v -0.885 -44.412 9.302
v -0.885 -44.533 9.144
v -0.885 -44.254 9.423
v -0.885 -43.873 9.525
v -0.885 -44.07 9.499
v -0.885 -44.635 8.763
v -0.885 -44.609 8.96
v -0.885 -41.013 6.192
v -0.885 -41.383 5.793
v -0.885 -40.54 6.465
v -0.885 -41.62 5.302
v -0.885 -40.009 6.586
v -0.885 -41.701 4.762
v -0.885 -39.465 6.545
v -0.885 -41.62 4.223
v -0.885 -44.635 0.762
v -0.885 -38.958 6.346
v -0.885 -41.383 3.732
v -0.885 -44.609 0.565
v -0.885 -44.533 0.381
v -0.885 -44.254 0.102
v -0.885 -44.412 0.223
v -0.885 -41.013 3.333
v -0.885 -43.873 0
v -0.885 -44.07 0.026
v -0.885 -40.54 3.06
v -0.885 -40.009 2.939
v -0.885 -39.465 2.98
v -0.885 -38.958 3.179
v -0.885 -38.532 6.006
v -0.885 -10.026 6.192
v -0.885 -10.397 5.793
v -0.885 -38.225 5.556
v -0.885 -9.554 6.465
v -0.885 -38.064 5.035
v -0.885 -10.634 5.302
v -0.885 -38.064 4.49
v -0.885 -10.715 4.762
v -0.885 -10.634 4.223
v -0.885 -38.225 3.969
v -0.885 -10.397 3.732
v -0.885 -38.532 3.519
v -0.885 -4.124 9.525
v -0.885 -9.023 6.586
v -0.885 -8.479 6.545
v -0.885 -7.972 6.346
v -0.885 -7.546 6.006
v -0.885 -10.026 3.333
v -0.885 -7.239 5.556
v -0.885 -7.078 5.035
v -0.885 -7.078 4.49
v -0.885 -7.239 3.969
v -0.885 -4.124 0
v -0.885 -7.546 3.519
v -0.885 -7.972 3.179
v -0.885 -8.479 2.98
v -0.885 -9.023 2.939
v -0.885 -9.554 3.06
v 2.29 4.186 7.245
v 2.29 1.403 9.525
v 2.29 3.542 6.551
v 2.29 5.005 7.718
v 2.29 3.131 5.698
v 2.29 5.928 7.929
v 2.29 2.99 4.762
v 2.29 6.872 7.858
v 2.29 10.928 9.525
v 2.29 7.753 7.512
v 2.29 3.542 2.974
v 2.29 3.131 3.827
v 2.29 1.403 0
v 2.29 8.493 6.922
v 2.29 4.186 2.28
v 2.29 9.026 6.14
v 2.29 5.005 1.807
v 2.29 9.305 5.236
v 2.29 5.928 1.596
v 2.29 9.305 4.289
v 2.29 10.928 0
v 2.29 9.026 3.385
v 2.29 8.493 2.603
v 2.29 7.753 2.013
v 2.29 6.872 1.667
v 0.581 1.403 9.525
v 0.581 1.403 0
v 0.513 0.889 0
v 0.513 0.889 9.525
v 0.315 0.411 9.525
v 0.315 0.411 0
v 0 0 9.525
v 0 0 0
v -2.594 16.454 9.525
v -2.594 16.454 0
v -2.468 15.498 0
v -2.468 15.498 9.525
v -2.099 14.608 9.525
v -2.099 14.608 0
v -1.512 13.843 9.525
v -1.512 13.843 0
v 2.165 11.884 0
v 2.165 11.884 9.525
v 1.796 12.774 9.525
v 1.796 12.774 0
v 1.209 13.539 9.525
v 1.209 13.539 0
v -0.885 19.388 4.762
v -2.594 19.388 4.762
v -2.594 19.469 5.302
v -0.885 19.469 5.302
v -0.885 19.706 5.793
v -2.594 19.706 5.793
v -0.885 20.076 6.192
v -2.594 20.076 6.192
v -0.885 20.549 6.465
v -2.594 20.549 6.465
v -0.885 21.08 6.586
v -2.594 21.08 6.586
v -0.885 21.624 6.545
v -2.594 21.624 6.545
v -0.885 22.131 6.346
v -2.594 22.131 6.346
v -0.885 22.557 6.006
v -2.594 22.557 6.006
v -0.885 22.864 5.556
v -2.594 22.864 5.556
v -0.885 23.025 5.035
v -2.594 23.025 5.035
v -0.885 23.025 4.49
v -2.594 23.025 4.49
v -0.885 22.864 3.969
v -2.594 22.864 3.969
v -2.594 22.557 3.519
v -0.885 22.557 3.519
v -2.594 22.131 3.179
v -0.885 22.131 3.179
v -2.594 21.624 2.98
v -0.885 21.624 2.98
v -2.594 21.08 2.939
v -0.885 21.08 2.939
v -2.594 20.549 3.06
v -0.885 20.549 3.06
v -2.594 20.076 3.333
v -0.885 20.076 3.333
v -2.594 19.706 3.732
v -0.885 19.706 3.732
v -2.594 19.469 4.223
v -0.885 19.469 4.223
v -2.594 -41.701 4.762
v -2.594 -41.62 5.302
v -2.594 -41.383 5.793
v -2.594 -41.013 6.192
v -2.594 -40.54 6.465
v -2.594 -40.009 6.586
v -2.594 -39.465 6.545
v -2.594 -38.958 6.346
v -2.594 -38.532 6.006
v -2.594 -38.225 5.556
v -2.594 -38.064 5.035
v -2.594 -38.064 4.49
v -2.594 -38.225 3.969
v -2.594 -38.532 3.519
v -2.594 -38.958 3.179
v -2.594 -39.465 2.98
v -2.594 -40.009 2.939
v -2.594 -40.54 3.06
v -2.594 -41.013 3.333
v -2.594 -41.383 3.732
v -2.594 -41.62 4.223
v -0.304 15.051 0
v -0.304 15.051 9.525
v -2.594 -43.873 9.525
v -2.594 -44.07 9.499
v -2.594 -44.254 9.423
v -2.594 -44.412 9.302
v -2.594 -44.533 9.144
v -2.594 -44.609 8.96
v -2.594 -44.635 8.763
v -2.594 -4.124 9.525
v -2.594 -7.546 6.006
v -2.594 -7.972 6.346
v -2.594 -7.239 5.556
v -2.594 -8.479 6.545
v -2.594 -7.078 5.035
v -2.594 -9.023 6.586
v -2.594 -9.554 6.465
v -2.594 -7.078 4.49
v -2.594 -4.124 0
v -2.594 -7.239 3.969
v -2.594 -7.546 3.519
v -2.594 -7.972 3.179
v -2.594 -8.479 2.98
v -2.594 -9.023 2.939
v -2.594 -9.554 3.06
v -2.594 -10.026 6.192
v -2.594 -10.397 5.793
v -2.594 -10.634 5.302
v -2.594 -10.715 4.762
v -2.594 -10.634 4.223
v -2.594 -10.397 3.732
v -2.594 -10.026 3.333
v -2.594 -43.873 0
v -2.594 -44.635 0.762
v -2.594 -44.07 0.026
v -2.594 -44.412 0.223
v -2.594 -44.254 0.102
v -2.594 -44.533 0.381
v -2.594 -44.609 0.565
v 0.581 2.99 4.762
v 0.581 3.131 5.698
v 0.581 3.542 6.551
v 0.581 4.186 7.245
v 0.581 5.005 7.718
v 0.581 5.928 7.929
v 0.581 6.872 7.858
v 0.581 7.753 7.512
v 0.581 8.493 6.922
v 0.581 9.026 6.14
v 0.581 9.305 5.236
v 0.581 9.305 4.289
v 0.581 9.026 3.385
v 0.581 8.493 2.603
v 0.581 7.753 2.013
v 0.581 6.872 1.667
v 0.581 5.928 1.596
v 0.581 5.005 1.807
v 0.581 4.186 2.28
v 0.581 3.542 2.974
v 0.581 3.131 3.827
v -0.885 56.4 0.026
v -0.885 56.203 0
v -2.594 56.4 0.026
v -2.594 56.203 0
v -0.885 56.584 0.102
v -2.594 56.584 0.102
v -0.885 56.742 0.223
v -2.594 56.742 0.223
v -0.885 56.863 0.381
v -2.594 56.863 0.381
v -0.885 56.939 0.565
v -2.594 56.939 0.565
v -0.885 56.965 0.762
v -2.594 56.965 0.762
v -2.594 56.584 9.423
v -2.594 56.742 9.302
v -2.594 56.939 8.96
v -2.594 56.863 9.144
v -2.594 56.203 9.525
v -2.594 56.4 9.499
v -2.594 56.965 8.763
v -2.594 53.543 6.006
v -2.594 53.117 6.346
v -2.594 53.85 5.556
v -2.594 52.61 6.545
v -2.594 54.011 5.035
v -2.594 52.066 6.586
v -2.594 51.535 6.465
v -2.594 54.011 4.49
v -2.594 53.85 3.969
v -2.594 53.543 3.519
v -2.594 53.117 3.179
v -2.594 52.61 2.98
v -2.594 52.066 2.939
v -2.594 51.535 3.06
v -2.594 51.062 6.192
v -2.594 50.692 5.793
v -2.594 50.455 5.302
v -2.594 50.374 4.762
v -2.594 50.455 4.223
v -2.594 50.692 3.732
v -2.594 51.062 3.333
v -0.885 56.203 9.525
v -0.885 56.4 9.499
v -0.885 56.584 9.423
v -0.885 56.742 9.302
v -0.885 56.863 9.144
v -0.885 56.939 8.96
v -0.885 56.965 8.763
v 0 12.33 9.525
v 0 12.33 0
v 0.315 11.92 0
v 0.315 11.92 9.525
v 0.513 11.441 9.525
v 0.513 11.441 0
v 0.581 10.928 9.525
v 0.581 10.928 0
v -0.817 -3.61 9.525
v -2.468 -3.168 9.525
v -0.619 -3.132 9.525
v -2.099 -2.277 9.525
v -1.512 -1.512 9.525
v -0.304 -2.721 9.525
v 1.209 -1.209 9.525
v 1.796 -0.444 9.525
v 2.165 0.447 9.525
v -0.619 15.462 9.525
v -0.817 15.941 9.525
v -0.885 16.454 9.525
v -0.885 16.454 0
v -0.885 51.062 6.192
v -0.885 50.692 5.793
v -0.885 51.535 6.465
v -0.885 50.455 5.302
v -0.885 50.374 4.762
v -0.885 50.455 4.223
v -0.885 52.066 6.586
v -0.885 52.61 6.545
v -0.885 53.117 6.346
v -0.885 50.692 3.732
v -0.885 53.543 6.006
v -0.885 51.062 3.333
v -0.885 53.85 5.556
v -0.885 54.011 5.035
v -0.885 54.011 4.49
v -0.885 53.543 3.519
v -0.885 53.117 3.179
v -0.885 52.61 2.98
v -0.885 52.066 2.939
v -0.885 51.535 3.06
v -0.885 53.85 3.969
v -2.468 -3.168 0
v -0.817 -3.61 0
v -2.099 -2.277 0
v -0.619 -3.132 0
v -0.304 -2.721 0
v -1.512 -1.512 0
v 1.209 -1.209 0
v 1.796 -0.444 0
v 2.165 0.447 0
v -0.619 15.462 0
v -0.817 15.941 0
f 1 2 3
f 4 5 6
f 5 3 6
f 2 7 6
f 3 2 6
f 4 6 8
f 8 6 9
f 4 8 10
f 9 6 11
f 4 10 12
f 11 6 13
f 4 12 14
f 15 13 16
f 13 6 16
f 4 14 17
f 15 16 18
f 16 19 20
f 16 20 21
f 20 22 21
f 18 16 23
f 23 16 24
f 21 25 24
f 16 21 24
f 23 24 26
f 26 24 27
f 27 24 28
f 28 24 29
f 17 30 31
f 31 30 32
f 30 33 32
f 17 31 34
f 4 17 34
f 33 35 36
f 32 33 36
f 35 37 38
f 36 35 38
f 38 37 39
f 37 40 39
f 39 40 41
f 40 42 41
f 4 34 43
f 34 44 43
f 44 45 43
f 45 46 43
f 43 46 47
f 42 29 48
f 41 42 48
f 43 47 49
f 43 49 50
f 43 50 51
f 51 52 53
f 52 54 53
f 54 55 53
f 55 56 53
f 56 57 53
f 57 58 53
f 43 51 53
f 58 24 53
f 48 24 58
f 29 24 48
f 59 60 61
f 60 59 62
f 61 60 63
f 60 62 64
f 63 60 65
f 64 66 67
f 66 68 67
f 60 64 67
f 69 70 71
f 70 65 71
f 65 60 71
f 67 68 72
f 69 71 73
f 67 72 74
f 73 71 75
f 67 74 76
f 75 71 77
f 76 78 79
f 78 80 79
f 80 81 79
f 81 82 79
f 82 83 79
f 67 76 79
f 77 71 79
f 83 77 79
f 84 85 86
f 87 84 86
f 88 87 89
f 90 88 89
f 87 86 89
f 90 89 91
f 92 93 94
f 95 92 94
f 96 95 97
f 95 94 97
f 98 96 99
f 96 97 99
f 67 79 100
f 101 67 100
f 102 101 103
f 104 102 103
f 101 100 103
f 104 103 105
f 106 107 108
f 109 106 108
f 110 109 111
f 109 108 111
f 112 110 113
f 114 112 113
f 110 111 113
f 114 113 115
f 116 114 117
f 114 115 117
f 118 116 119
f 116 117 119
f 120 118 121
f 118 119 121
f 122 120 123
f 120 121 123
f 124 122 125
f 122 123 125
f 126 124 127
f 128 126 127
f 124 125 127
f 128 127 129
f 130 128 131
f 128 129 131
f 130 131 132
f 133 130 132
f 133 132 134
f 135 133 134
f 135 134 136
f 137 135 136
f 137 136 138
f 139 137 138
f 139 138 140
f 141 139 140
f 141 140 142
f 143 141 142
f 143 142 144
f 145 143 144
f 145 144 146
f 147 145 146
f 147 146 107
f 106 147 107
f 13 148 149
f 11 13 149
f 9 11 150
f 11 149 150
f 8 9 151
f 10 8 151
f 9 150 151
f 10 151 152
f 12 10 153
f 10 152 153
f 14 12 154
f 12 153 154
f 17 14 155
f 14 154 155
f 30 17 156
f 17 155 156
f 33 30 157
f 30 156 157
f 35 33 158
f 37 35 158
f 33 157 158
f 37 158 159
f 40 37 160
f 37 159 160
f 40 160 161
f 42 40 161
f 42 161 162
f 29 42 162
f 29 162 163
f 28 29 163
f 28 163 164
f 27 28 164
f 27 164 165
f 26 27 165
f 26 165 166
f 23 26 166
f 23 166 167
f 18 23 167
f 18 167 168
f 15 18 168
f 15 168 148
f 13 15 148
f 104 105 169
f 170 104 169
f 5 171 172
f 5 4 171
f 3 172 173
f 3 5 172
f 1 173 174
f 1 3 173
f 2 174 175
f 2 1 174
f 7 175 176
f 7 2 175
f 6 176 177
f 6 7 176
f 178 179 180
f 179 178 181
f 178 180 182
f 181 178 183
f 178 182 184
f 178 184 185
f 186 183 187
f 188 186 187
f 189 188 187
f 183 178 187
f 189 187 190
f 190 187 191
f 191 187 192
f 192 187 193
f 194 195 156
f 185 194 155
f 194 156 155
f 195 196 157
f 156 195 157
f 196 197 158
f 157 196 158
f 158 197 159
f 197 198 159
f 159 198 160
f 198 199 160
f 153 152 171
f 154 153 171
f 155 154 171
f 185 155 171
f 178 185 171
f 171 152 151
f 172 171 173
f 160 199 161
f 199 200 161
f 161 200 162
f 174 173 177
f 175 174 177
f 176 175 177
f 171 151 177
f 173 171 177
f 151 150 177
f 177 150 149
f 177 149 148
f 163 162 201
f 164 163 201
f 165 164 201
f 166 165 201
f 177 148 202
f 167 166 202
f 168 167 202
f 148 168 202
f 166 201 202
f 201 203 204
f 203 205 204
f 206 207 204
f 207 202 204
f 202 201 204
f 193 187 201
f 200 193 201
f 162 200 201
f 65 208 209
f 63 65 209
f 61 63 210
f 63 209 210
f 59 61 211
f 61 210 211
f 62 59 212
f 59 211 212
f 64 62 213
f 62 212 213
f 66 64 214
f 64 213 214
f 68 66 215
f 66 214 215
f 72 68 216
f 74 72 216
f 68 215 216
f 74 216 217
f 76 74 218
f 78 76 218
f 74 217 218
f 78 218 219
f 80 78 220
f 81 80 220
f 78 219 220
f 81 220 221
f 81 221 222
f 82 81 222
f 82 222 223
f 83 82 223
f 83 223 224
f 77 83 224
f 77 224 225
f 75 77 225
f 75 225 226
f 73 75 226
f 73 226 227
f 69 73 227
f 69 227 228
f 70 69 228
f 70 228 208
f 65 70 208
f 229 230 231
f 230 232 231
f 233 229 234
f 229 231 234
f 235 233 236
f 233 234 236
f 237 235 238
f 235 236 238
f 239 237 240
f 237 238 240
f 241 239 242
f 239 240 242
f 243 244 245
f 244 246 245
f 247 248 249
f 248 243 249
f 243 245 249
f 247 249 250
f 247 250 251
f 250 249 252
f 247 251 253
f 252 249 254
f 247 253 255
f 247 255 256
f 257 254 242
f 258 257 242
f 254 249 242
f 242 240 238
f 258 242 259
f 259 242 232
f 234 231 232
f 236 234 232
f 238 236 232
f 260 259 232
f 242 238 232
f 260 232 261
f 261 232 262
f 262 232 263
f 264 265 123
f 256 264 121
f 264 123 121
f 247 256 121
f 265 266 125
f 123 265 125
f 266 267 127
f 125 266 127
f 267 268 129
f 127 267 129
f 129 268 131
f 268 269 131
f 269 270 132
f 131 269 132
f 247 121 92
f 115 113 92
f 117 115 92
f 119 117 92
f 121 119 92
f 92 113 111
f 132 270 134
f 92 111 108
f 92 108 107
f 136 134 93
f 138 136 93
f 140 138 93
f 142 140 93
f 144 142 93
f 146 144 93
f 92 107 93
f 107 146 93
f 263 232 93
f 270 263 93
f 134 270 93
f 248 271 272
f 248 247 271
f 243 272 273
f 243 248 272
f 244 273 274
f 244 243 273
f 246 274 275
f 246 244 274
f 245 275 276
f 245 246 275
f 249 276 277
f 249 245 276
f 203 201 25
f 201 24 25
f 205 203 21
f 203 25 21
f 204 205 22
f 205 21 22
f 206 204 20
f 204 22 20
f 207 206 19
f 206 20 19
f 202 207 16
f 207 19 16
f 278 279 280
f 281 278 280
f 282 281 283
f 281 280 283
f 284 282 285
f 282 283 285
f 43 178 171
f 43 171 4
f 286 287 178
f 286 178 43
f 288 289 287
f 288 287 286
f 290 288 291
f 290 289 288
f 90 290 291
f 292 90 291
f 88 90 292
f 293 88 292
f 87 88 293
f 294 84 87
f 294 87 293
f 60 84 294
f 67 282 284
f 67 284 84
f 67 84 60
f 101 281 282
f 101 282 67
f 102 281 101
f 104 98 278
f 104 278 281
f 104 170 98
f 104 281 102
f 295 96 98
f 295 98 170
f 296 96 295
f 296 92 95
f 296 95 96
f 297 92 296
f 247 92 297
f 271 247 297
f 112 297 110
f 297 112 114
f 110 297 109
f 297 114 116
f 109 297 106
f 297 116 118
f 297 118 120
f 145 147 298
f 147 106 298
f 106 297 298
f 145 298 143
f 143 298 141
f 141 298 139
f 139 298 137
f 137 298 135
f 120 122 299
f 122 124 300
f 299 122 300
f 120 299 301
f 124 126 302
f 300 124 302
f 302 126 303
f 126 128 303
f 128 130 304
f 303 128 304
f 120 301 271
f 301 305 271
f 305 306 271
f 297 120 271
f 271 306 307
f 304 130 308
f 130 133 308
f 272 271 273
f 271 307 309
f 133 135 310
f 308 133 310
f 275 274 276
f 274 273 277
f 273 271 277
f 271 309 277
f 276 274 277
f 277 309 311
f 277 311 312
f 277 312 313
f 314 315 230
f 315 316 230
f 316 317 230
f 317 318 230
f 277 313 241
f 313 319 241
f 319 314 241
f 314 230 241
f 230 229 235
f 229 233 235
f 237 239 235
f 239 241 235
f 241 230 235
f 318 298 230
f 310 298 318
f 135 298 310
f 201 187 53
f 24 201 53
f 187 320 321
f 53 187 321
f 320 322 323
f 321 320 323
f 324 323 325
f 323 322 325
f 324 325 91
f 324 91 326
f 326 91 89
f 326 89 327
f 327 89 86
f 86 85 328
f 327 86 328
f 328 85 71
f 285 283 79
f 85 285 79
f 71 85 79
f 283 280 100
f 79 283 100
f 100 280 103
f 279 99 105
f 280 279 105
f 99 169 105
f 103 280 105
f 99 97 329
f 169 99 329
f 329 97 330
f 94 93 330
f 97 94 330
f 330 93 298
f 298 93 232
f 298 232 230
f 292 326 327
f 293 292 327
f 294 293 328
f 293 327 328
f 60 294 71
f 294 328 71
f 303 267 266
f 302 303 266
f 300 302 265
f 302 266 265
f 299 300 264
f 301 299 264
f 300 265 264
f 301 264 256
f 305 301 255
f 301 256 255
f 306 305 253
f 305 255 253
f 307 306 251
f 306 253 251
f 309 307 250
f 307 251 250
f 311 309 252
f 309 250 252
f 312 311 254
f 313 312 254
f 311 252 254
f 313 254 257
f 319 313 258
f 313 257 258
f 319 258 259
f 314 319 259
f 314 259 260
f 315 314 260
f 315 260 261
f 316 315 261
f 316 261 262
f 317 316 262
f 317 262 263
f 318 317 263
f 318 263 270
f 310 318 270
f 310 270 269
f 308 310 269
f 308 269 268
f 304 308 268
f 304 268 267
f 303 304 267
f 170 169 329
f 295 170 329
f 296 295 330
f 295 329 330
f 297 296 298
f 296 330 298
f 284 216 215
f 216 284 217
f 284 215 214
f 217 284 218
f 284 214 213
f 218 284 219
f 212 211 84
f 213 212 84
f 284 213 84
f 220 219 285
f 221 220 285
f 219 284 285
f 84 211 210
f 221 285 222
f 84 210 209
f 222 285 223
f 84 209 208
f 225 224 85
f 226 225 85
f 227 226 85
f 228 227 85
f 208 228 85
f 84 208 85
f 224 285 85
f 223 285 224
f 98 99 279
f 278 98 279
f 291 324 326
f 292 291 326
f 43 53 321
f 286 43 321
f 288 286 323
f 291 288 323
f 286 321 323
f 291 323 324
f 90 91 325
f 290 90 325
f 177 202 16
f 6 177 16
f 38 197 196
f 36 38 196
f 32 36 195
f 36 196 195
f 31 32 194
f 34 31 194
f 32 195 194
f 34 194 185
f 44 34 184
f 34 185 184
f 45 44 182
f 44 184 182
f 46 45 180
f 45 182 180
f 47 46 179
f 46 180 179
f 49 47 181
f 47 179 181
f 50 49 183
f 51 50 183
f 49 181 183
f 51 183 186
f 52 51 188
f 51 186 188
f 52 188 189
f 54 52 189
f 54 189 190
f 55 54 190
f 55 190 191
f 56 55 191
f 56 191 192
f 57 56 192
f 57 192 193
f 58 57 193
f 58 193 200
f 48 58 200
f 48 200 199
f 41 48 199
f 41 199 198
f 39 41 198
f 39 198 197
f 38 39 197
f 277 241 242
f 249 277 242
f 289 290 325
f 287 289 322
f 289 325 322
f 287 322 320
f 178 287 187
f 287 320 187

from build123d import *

# Parameters (mm, degrees)
F1_DEPTH = 9.525
F2_R     = 1.8288
F2_R_2   = 3.175
F3_DEPTH = 4.88442
F4_R     = 0.762


with BuildPart() as f1:
    # F0 (on Top) → F1 (new body)
    with BuildSketch(Plane.XY):
        with BuildLine():
            ThreePointArc((0.581024, 1.402716), (0.430021, 0.643572), (0, 0))
            Line((0, 0), (-1.512274, -1.512274))
            ThreePointArc((-1.512274, -1.512274), (-2.312851, -2.710422), (-2.593976, -4.123733))
            Line((-2.593976, -4.123733), (-2.593976, -44.634784))
            Line((-2.593976, -44.634784), (-0.884556, -44.634784))
            Line((-0.884556, -44.634784), (-0.884556, -4.123733))
            ThreePointArc((-0.884556, -4.123733), (-0.733553, -3.364588), (-0.303532, -2.721017))
            Line((-0.303532, -2.721017), (1.208743, -1.208742))
            ThreePointArc((1.208743, -1.208742), (2.009319, -0.010595), (2.290444, 1.402716))
            Line((2.290444, 1.402716), (2.290444, 10.927716))
            ThreePointArc((2.290444, 10.927716), (2.009319, 12.341027), (1.208743, 13.539175))
            Line((1.208743, 13.539175), (-0.303532, 15.051449))
            ThreePointArc((-0.303532, 15.051449), (-0.733553, 15.695021), (-0.884556, 16.454165))
            Line((-0.884556, 16.454165), (-0.884556, 56.965216))
            Line((-0.884556, 56.965216), (-2.593976, 56.965216))
            Line((-2.593976, 56.965216), (-2.593976, 16.454165))
            ThreePointArc((-2.593976, 16.454165), (-2.312851, 15.040854), (-1.512274, 13.842707))
            Line((-1.512274, 13.842707), (0, 12.330432))
            ThreePointArc((0, 12.330432), (0.430021, 11.686861), (0.581024, 10.927716))
            Line((0.581024, 10.927716), (0.581024, 1.402716))
        make_face()
    extrude(amount=F1_DEPTH)

    # F2 (on face) → F3 (cut, through all)
    with BuildSketch(Plane(origin=(-2.593976, 0, 0), x_dir=(0, -1, 0), z_dir=(-1, 0, 0))):
        with Locations((-52.202716, 4.7625)):
            Circle(F2_R)
        with Locations((-21.216665, 4.7625)):
            Circle(F2_R)
        with Locations((8.886233, 4.7625)):
            Circle(F2_R)
        with Locations((39.872284, 4.7625)):
            Circle(F2_R)
        with Locations((-6.165216, 4.7625)):
            Circle(F2_R_2)
    extrude(amount=-F3_DEPTH, mode=Mode.SUBTRACT)

    # F4
    f4_edges = [f1.edges().sort_by_distance(p)[0] for p in [
        (-1.739266, 56.965216, 9.525),
        (-1.739266, 56.965216, 0),
        (-1.739266, -44.634784, 9.525),
        (-1.739266, -44.634784, 0),
    ]]
    fillet(f4_edges, radius=F4_R)


solid = f1.part
